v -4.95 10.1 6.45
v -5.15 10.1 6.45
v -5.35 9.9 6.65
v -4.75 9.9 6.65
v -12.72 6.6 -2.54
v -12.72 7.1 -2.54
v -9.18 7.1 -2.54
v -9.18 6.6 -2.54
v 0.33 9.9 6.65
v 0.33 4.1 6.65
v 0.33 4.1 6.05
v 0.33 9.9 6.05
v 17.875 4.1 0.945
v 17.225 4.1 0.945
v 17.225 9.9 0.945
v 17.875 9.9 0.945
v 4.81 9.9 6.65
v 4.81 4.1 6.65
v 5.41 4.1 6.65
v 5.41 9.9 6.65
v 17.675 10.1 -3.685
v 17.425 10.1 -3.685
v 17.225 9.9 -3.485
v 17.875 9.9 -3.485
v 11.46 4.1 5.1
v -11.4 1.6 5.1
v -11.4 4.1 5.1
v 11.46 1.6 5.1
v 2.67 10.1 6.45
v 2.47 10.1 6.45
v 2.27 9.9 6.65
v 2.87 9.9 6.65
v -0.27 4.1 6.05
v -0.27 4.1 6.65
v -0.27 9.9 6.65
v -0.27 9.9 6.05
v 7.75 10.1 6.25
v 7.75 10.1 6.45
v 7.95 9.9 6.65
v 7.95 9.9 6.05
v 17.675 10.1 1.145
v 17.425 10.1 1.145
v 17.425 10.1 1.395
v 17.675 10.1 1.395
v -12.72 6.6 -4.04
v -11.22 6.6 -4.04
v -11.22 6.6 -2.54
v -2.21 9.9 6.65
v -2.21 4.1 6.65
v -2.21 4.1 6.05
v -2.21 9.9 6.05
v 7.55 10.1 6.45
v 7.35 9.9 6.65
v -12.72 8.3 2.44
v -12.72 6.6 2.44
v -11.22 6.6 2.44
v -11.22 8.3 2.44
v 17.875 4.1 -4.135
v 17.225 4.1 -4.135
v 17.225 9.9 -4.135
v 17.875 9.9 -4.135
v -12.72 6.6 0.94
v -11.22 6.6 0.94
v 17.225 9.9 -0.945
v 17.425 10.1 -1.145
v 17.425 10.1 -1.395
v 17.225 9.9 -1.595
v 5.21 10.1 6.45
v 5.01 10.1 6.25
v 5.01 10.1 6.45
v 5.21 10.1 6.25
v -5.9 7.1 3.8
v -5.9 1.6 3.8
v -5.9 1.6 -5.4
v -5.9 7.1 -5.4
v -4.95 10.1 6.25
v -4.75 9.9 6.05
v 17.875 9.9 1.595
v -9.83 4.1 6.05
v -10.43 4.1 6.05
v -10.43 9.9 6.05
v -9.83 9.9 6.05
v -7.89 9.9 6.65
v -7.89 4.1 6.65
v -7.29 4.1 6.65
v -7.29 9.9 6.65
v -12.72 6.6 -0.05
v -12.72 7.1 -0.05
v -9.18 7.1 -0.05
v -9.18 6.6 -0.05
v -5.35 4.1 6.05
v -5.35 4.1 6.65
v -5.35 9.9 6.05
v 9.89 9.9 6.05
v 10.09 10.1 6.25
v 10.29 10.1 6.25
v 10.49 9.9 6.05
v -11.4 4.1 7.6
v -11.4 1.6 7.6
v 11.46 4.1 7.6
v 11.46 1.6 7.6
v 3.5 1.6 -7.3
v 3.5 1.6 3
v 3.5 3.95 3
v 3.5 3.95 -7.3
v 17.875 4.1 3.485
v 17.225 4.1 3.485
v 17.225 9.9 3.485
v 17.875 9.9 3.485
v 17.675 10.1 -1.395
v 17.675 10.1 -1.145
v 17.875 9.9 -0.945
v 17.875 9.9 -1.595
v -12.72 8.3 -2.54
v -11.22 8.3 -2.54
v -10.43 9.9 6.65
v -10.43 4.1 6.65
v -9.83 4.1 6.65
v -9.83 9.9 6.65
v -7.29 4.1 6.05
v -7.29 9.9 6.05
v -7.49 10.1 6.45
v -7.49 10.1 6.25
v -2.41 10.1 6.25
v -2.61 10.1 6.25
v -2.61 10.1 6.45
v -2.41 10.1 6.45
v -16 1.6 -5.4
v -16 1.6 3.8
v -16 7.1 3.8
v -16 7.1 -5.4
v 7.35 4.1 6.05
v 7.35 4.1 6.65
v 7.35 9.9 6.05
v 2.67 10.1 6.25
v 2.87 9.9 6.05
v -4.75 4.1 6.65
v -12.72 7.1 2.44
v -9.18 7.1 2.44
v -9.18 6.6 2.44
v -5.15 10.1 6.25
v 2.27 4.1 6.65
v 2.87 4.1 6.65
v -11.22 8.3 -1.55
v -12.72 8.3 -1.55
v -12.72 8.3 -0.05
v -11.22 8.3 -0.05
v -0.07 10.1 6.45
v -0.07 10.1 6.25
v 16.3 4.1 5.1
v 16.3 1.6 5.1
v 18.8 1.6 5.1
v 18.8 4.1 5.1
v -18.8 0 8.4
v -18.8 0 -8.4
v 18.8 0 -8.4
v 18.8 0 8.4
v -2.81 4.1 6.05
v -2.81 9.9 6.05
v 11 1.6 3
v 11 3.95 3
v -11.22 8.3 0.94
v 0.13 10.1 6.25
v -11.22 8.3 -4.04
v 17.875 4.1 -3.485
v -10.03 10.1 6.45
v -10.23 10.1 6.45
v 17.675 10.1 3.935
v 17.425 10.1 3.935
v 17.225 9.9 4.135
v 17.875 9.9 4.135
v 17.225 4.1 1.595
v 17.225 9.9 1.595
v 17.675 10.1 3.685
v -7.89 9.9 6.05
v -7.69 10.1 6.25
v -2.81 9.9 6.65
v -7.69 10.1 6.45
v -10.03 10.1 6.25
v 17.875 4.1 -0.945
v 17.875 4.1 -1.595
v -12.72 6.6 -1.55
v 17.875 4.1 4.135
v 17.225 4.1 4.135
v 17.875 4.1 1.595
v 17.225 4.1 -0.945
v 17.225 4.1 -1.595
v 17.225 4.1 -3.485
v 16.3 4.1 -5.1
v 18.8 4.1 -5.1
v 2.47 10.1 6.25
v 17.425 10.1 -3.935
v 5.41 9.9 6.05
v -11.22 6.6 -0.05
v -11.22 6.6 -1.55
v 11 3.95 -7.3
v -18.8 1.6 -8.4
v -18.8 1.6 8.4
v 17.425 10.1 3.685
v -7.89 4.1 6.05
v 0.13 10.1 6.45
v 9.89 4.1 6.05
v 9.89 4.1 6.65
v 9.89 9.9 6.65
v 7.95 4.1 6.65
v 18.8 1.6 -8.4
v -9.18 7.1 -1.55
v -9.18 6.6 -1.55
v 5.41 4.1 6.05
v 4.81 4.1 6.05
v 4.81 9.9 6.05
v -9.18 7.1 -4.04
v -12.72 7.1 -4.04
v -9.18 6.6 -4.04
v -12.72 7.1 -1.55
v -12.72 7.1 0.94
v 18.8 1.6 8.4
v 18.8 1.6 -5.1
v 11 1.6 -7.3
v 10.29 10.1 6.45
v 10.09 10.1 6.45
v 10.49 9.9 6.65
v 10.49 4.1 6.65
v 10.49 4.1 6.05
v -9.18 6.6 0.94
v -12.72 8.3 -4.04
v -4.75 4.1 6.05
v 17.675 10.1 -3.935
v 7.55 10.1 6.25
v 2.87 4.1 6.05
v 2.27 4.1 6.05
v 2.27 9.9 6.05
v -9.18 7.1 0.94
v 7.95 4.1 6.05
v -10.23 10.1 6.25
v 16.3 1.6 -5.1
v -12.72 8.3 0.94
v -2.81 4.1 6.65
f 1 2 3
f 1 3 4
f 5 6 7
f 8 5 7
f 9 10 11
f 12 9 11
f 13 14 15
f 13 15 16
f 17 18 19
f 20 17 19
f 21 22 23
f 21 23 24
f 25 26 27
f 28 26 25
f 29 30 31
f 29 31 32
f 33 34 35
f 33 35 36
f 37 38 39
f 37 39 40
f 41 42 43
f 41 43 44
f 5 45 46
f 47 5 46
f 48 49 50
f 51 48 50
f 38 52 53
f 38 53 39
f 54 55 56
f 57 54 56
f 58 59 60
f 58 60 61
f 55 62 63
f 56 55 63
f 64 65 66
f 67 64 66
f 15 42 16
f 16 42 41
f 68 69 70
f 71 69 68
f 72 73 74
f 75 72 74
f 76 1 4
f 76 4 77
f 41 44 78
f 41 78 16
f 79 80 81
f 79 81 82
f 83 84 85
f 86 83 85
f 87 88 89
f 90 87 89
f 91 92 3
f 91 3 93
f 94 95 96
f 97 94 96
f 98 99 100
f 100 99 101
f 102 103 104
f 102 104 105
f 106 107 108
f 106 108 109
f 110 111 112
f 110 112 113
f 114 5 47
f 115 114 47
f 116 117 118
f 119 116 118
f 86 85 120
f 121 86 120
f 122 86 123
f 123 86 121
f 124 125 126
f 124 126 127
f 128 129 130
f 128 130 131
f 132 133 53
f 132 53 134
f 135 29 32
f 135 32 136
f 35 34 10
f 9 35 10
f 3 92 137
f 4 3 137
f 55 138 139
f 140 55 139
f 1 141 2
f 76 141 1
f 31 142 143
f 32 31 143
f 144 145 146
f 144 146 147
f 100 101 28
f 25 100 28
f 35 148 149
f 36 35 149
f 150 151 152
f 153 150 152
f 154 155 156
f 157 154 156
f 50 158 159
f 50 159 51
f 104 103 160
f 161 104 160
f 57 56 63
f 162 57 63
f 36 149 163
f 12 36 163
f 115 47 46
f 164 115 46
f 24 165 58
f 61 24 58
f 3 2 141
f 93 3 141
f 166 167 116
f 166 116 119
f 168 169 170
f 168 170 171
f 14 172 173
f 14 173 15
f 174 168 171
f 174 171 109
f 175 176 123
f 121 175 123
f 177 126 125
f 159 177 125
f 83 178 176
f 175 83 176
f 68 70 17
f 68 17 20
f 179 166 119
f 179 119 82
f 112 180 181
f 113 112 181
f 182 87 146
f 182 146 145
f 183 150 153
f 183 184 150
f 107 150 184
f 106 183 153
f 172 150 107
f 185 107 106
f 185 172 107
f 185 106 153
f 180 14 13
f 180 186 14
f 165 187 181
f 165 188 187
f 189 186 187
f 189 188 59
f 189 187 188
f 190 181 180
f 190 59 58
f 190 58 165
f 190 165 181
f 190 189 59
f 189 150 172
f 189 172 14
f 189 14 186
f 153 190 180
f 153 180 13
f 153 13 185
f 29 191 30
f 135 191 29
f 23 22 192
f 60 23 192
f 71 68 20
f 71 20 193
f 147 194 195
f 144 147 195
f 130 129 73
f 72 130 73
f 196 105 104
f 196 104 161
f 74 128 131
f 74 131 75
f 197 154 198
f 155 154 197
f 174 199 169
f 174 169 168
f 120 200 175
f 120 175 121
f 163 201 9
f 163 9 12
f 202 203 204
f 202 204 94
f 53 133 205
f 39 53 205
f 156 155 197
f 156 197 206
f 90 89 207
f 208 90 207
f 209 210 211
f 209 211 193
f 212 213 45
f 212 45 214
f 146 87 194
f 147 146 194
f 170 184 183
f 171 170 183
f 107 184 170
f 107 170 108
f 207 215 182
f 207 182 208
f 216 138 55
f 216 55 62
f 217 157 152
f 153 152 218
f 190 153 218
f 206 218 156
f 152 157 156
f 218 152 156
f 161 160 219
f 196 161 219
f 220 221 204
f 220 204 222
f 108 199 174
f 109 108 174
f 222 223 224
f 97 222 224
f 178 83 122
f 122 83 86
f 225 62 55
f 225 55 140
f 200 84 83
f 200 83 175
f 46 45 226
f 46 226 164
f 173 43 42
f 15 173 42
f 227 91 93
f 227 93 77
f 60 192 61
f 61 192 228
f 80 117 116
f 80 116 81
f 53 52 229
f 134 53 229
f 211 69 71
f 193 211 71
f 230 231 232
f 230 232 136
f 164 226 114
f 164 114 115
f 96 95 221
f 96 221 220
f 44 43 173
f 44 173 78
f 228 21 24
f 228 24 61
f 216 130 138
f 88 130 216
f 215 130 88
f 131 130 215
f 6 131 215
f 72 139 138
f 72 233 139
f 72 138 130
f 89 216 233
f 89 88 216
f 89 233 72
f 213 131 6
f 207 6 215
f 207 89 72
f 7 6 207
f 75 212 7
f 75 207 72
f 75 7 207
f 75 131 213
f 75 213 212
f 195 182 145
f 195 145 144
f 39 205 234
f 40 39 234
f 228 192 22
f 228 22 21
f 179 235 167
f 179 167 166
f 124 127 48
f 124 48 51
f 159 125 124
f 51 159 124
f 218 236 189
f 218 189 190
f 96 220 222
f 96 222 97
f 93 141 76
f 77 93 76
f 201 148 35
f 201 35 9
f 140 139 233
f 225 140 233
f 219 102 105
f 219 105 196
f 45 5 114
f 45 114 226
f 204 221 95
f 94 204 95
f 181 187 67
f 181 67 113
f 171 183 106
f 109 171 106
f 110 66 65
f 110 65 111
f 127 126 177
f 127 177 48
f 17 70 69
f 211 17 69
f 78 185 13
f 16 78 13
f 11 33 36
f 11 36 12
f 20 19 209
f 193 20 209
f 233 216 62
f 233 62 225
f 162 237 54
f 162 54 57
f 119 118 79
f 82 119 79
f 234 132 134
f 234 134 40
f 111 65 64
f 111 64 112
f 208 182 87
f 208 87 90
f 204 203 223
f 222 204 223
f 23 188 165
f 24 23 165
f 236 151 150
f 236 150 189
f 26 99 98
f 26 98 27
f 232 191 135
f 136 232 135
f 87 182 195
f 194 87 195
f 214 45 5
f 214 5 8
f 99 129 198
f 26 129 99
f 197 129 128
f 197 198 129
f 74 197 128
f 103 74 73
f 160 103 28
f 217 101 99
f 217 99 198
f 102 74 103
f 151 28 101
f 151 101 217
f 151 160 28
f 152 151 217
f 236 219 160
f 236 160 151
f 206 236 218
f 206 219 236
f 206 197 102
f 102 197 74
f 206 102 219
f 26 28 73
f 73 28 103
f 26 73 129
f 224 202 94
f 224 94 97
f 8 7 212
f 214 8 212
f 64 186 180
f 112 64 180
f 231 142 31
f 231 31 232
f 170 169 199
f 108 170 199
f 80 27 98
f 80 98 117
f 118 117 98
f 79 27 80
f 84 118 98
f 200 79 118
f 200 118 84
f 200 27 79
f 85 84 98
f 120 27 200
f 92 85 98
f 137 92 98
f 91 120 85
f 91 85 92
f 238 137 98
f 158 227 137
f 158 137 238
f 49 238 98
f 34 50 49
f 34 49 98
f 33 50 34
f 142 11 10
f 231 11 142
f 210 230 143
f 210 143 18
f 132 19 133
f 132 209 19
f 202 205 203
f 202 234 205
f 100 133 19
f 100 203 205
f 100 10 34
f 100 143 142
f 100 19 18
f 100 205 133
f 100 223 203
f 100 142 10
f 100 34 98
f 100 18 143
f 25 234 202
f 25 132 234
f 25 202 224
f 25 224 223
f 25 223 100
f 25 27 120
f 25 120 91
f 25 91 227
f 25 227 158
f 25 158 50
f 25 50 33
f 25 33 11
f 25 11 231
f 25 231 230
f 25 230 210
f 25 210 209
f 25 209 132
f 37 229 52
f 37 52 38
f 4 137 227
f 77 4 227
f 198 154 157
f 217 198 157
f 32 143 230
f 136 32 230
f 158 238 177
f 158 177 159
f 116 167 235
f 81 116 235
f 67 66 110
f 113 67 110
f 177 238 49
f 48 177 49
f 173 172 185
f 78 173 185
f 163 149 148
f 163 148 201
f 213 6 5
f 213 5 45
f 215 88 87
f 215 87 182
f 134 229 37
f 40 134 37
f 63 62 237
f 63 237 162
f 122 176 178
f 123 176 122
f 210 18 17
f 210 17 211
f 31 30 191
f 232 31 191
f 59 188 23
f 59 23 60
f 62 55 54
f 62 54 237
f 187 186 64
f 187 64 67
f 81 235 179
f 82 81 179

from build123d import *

# Parameters (mm, degrees)
SKETCH1_W              = 37.6
SKETCH1_H              = 16.8
BOSS_EXTRUDE1_DEPTH    = 1.6
SKETCH3_W              = 22.86
SKETCH3_H              = 2.5
BOSS_EXTRUDE3_DEPTH    = 2.5
SKETCH2_W              = 0.6
SKETCH2_H              = 0.6
BOSS_EXTRUDE2_DEPTH    = 8.5
SKETCH4_W              = 2.5
SKETCH4_H              = 10.2
BOSS_EXTRUDE4_DEPTH    = 2.5
SKETCH9_W              = 7.5
SKETCH9_H              = 10.3
BOSS_EXTRUDE9_DEPTH    = 2.35
SKETCH10_W             = 0.65
SKETCH10_H             = 0.65
BOSS_EXTRUDE10_DEPTH   = 6
CHAMFER1_SIZE          = 0.2
SKETCH11_W             = 10.1
SKETCH11_H             = 9.2
BOSS_EXTRUDE11_DEPTH   = 5.5
SKETCH12_W             = 3.54
SKETCH12_H             = 1.5
CUT_EXTRUDE1_DEPTH     = 0.5
SKETCH13_W             = 1.5
SKETCH13_H             = 1.5
BOSS_EXTRUDE12_DEPTH   = 1.7
BOSS_EXTRUDE12_2_DEPTH = 1.7
BOSS_EXTRUDE12_3_DEPTH = 1.7


with BuildPart() as part:
    # Sketch1 → Boss-Extrude1 (new body)
    with BuildSketch(Plane(origin=(0, 0, 0), x_dir=(1, 0, 0), z_dir=(0, 1, 0))):
        Rectangle(SKETCH1_W, SKETCH1_H)
    extrude(amount=BOSS_EXTRUDE1_DEPTH)

    # Sketch3 → Boss-Extrude3 (add)
    with BuildSketch(Plane(origin=(0, 1.6, 0), x_dir=(1, 0, 0), z_dir=(0, 1, 0))):
        with Locations((0.03, -6.35)):
            Rectangle(SKETCH3_W, SKETCH3_H)
    extrude(amount=BOSS_EXTRUDE3_DEPTH)

    # Sketch2 → Boss-Extrude2 (add)
    with BuildSketch(Plane(origin=(0, 1.6, 0), x_dir=(1, 0, 0), z_dir=(0, 1, 0))):
        with Locations((-7.59, -6.35)):
            Rectangle(SKETCH2_W, SKETCH2_H)
        with Locations((-10.13, -6.35)):
            Rectangle(SKETCH2_W, SKETCH2_H)
        with Locations((-5.05, -6.35)):
            Rectangle(SKETCH2_W, SKETCH2_H)
        with Locations((-2.51, -6.35)):
            Rectangle(SKETCH2_W, SKETCH2_H)
        with Locations((0.03, -6.35)):
            Rectangle(SKETCH2_W, SKETCH2_H)
        with Locations((2.57, -6.35)):
            Rectangle(SKETCH2_W, SKETCH2_H)
        with Locations((5.11, -6.35)):
            Rectangle(SKETCH2_W, SKETCH2_H)
        with Locations((7.65, -6.35)):
            Rectangle(SKETCH2_W, SKETCH2_H)
        with Locations((10.19, -6.35)):
            Rectangle(SKETCH2_W, SKETCH2_H)
    extrude(amount=BOSS_EXTRUDE2_DEPTH)

    # Sketch9 → Boss-Extrude9 (add)
    with BuildSketch(Plane(origin=(0, 1.6, 0), x_dir=(1, 0, 0), z_dir=(0, 1, 0))):
        with Locations((7.25, 2.15)):
            Rectangle(SKETCH9_W, SKETCH9_H)
    extrude(amount=BOSS_EXTRUDE9_DEPTH)


with BuildPart() as body_2:
    # Sketch4 → Boss-Extrude4 (new body)
    with BuildSketch(Plane(origin=(0, 1.6, 0), x_dir=(1, 0, 0), z_dir=(0, 1, 0))):
        with Locations((17.55, 0)):
            Rectangle(SKETCH4_W, SKETCH4_H)
    extrude(amount=BOSS_EXTRUDE4_DEPTH)


    add(part.part)  # Boss-Extrude10 merges part
    # Sketch10 → Boss-Extrude10 (add)
    with BuildSketch(Plane(origin=(0, 4.1, 0), x_dir=(1, 0, 0), z_dir=(0, 1, 0))):
        with Locations((17.55, -1.27)):
            Rectangle(SKETCH10_W, SKETCH10_H)
        with Locations((17.55, 1.27)):
            Rectangle(SKETCH10_W, SKETCH10_H)
        with Locations((17.55, 3.81)):
            Rectangle(SKETCH10_W, SKETCH10_H)
        with Locations((17.55, -3.81)):
            Rectangle(SKETCH10_W, SKETCH10_H)
    extrude(amount=BOSS_EXTRUDE10_DEPTH)

    # Chamfer1
    chamfer1_edges = [body_2.edges().sort_by_distance(p)[0] for p in [
        (17.55, 10.1, -1.595),
        (17.875, 10.1, -1.27),
        (17.55, 10.1, -0.945),
        (17.225, 10.1, -1.27),
        (17.55, 10.1, -4.135),
        (17.875, 10.1, -3.81),
        (17.55, 10.1, -3.485),
        (17.225, 10.1, -3.81),
        (17.55, 10.1, 3.485),
        (17.875, 10.1, 3.81),
        (17.55, 10.1, 4.135),
        (17.225, 10.1, 3.81),
        (17.55, 10.1, 0.945),
        (17.875, 10.1, 1.27),
        (17.55, 10.1, 1.595),
        (17.225, 10.1, 1.27),
        (-10.43, 10.1, 6.35),
        (-10.13, 10.1, 6.65),
        (-9.83, 10.1, 6.35),
        (-10.13, 10.1, 6.05),
        (-7.89, 10.1, 6.35),
        (-7.59, 10.1, 6.65),
        (-7.29, 10.1, 6.35),
        (-7.59, 10.1, 6.05),
        (-5.35, 10.1, 6.35),
        (-5.05, 10.1, 6.65),
        (-4.75, 10.1, 6.35),
        (-5.05, 10.1, 6.05),
        (-2.81, 10.1, 6.35),
        (-2.51, 10.1, 6.65),
        (-2.21, 10.1, 6.35),
        (-2.51, 10.1, 6.05),
        (-0.27, 10.1, 6.35),
        (0.03, 10.1, 6.65),
        (0.33, 10.1, 6.35),
        (0.03, 10.1, 6.05),
        (2.27, 10.1, 6.35),
        (2.57, 10.1, 6.65),
        (2.87, 10.1, 6.35),
        (2.57, 10.1, 6.05),
        (4.81, 10.1, 6.35),
        (5.11, 10.1, 6.65),
        (5.41, 10.1, 6.35),
        (5.11, 10.1, 6.05),
        (7.35, 10.1, 6.35),
        (7.65, 10.1, 6.65),
        (7.95, 10.1, 6.35),
        (7.65, 10.1, 6.05),
        (9.89, 10.1, 6.35),
        (10.19, 10.1, 6.65),
        (10.49, 10.1, 6.35),
        (10.19, 10.1, 6.05),
    ]]
    chamfer(chamfer1_edges, length=CHAMFER1_SIZE)

    # Sketch11 → Boss-Extrude11 (add)
    with BuildSketch(Plane(origin=(0, 1.6, 0), x_dir=(1, 0, 0), z_dir=(0, 1, 0))):
        with Locations((-10.95, 0.8)):
            Rectangle(SKETCH11_W, SKETCH11_H)
    extrude(amount=BOSS_EXTRUDE11_DEPTH)

    # Sketch12 → Cut-Extrude1 (cut)
    with BuildSketch(Plane(origin=(0, 7.1, 0), x_dir=(1, 0, 0), z_dir=(0, 1, 0))):
        with Locations((-10.95, 3.29)):
            Rectangle(SKETCH12_W, SKETCH12_H)
        with Locations((-10.95, 0.8)):
            Rectangle(SKETCH12_W, SKETCH12_H)
        with Locations((-10.95, -1.69)):
            Rectangle(SKETCH12_W, SKETCH12_H)
    extrude(amount=-CUT_EXTRUDE1_DEPTH, mode=Mode.SUBTRACT)


with BuildPart() as body_2_2:
    # Sketch13 → Boss-Extrude12 (new body)
    with BuildSketch(Plane(origin=(0, 6.6, 0), x_dir=(1, 0, 0), z_dir=(0, 1, 0))):
        with Locations((-11.97, 3.29)):
            Rectangle(SKETCH13_W, SKETCH13_H)
    extrude(amount=BOSS_EXTRUDE12_DEPTH)


with BuildPart() as body_3:
    # Sketch13 → Boss-Extrude12 2 (new body)
    with BuildSketch(Plane(origin=(0, 6.6, 0), x_dir=(1, 0, 0), z_dir=(0, 1, 0))):
        with Locations((-11.97, 0.8)):
            Rectangle(SKETCH13_W, SKETCH13_H)
    extrude(amount=BOSS_EXTRUDE12_2_DEPTH)


with BuildPart() as body_4:
    # Sketch13 → Boss-Extrude12 3 (new body)
    with BuildSketch(Plane(origin=(0, 6.6, 0), x_dir=(1, 0, 0), z_dir=(0, 1, 0))):
        with Locations((-11.97, -1.69)):
            Rectangle(SKETCH13_W, SKETCH13_H)
    extrude(amount=BOSS_EXTRUDE12_3_DEPTH)


solid = Compound([body_2.part, body_2_2.part, body_3.part, body_4.part])
